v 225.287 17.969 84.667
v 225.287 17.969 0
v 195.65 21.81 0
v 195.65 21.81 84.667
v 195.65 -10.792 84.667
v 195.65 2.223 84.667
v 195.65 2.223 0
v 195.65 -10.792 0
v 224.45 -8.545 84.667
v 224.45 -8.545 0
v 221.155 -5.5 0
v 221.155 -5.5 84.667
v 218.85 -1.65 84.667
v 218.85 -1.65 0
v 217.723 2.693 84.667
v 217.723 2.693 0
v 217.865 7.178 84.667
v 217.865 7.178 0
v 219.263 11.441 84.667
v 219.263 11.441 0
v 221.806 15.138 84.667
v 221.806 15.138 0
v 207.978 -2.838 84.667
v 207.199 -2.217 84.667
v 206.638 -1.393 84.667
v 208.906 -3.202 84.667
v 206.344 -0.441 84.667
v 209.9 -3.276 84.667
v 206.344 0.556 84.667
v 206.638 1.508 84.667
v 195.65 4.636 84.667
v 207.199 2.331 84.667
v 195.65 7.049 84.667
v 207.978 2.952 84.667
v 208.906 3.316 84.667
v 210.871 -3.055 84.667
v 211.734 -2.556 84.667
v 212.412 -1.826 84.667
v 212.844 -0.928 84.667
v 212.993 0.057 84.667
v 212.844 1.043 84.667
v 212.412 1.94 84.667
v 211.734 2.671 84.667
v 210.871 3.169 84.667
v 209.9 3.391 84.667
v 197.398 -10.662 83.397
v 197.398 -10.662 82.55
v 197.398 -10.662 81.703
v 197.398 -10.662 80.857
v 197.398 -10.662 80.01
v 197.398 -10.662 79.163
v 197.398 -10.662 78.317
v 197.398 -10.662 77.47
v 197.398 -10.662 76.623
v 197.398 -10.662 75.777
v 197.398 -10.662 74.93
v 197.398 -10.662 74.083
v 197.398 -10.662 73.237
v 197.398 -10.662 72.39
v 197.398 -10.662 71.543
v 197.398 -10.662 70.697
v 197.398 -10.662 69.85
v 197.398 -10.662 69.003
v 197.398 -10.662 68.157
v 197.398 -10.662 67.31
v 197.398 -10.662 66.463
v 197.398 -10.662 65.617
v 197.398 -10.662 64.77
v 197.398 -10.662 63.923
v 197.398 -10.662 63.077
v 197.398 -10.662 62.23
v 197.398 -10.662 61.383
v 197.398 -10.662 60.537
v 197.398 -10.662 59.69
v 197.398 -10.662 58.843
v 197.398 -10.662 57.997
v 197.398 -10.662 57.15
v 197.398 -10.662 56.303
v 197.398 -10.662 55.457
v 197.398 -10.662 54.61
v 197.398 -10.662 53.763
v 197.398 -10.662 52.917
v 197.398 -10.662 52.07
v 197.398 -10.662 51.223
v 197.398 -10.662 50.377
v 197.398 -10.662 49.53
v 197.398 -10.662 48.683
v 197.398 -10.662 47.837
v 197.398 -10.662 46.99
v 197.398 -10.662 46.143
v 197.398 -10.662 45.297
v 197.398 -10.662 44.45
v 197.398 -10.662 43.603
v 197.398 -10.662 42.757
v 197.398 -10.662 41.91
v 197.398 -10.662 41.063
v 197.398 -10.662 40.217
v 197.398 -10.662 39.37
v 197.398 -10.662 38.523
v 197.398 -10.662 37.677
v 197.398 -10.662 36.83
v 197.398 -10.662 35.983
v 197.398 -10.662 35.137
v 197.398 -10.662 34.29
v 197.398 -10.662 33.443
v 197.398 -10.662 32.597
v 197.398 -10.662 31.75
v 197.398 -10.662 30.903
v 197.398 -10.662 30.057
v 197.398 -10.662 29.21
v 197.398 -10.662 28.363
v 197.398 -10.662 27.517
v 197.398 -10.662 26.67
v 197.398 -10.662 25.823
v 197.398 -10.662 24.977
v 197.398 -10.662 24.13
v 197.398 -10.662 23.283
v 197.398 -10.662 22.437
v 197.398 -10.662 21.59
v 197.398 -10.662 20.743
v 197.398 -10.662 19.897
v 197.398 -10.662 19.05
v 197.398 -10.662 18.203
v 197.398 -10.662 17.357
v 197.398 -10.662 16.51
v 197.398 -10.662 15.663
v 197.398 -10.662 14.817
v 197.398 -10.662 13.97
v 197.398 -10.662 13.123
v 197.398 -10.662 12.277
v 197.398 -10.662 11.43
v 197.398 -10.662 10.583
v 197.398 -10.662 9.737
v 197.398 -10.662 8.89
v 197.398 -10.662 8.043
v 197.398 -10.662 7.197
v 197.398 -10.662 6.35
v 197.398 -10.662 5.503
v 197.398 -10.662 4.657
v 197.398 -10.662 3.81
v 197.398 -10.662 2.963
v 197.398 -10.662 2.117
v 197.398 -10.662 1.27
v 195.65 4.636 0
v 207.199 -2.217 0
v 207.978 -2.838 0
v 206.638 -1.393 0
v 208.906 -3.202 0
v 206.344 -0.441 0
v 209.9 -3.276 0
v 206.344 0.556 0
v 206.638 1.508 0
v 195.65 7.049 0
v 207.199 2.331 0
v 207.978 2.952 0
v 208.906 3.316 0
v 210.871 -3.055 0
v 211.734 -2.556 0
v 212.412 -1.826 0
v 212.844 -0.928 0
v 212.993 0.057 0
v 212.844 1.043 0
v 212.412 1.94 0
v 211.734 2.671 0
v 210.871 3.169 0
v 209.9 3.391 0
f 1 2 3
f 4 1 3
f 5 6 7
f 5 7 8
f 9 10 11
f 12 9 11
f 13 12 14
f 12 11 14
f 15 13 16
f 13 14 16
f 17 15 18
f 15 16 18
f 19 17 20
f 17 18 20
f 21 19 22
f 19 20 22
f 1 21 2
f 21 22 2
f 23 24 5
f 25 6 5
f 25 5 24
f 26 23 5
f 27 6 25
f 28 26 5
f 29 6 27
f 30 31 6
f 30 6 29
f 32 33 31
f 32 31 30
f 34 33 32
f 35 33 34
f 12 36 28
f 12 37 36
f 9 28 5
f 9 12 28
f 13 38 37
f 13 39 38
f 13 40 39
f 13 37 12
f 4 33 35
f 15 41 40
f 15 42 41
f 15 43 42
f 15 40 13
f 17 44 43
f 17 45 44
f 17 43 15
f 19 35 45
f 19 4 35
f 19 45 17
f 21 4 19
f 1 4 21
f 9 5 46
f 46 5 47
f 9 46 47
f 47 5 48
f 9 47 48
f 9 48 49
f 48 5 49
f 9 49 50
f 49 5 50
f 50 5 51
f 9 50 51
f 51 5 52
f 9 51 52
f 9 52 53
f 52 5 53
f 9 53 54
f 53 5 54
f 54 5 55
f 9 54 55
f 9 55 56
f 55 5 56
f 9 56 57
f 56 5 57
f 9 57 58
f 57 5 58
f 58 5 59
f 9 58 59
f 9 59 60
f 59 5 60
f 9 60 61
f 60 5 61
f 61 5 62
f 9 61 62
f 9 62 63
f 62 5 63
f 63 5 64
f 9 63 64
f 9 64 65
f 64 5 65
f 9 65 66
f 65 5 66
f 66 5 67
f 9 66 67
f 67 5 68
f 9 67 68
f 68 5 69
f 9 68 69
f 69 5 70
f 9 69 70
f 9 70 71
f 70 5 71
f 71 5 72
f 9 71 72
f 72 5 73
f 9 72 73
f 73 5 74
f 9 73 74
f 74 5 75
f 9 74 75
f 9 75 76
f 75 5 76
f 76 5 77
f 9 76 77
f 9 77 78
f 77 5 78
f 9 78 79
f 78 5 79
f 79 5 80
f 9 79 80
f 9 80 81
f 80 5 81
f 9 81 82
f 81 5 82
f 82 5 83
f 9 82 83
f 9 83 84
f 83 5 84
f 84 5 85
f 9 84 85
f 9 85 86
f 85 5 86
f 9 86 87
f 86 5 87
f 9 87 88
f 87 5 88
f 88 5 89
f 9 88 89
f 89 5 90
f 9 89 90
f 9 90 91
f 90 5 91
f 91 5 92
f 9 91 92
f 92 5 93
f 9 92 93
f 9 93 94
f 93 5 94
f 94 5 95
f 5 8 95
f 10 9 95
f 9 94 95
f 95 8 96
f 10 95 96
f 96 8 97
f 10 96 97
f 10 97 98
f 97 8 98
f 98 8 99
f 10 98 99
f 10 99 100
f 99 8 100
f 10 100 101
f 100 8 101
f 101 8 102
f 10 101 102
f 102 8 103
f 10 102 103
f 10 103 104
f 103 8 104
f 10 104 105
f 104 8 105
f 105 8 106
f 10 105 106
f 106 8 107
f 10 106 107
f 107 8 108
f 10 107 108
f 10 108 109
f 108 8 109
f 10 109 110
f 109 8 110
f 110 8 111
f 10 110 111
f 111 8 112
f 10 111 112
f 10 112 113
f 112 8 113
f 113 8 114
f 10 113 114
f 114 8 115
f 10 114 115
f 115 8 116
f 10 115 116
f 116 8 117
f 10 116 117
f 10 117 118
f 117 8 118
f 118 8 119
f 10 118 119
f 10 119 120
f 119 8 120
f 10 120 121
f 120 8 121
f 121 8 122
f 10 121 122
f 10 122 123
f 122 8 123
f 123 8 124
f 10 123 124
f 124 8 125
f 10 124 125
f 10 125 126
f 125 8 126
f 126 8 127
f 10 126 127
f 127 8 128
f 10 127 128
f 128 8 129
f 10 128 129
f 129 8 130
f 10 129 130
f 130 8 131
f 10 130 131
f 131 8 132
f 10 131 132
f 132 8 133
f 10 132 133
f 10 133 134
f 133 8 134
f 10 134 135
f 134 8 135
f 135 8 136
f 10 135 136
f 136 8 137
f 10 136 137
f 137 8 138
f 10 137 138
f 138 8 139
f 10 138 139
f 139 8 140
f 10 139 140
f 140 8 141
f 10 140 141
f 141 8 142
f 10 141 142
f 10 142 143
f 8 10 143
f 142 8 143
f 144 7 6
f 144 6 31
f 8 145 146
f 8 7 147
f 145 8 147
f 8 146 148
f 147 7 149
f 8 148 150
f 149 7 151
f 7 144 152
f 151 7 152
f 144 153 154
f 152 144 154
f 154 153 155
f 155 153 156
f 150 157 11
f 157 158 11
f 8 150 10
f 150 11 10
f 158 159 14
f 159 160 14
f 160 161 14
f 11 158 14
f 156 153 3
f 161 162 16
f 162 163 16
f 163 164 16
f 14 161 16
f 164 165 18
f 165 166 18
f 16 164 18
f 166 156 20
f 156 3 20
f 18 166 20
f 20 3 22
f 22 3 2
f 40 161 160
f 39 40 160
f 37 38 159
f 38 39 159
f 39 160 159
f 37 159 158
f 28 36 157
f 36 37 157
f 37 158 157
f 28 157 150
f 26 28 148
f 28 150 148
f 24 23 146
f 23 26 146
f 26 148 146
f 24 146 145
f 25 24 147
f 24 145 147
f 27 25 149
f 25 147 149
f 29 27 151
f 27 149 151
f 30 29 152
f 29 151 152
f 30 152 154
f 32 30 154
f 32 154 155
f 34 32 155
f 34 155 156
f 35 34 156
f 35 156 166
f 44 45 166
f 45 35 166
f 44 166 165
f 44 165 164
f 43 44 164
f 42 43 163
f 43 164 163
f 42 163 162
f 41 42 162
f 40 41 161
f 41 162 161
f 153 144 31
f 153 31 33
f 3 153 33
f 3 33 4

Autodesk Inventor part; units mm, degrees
ref_plane "YZ Plane" through (0, 0, 0) normal (1, 0, 0) x (0, 1, 0)
ref_plane "XZ Plane" through (0, 0, 0) normal (0, 1, 0) x (-1, 0, 0)
ref_plane "XY Plane" through (0, 0, 0) normal (0, 0, 1) x (1, 0, 0)
sketch "Sketch2" plane through (0, 0, 0) normal (0, 0, 1) x (1, 0, 0)
  spline S0 degree 5 poles (319.6498, 0.0573) (319.6501, 0.0612) (319.6024, 0.0717) (319.3745, 0.1032) (319.3587, 0.1577) (318.7204, 0.2502) (318.4411, 0.3675) (317.6227, 0.5236) (316.9347, 0.7102) (315.9239, 0.9334) (314.8763, 1.1861) (313.6258, 1.4728) (312.2675, 1.7887) (310.7514, 2.1347) (309.1071, 2.5099) (307.3204, 2.9131) (305.4017, 3.3421) (303.3481, 3.7974) (301.1639, 4.2757) (298.8502, 4.7782) (296.4092, 5.301) (293.8432, 5.8446) (291.1548, 6.4061) (288.3466, 6.9857) (285.4207, 7.5803) (282.3807, 8.1894) (279.2284, 8.8107) (275.968, 9.4437) (272.6016, 10.0865) (269.1329, 10.7361) (265.5656, 11.3942) (261.9019, 12.0551) (258.1469, 12.7207) (254.3029, 13.3883) (250.3742, 14.0555) (246.3647, 14.7217) (242.2776, 15.3854) (238.118, 16.0441) (233.8887, 16.6979) (229.5952, 17.3434) (225.2402, 17.981) (220.8297, 18.6074) (216.3658, 19.2226) (211.8552, 19.8242) (207.3009, 20.4107) (202.7077, 20.9813) (198.0804, 21.5339) (193.4232, 22.0679) (188.7413, 22.58) (184.0389, 23.0713) (179.321, 23.5382) (174.592, 23.982) (169.8567, 24.3971) (165.1201, 24.7874) (160.3872, 25.1472) (155.6604, 25.4776) (150.948, 25.7772) (146.2454, 26.0449) (141.5744, 26.278) (136.9015, 26.4795) (132.2479, 26.6311) (127.6319, 26.7393) (123.054, 26.7999) (118.5202, 26.8147) (114.0397, 26.7815) (109.6094, 26.7031) (105.2517, 26.5723) (100.9331, 26.4088) (96.7495, 26.1663) (92.5147, 25.9483) (88.6376, 25.5343) (84.2302, 25.3974) (81.2071, 24.5612) (76.5297, 24.5259) (73.18, 23.8676) (69.3619, 23.413) (65.9721, 22.8018) (62.3454, 22.244) (59.4319, 21.514) (55.4307, 21.0148) (53.2464, 20.1084) (49.5889, 19.537) (47.2944, 18.6473) (44.3884, 17.909) (41.914, 17.071) (39.4431, 16.2394) (37.1538, 15.3738) (34.9769, 14.4941) (32.9455, 13.5944) (31.0501, 12.6807) (29.2961, 11.7542) (27.6837, 10.8151) (26.2149, 9.8673) (24.8895, 8.9103) (23.7099, 7.9467) (22.6751, 6.976) (21.7868, 6.0004) (21.0458, 5.0186) (20.4526, 4.032) (20.0117, 3.0392) (19.7221, 2.0438) (19.5893, 1.0479) (19.6118, 0.0538) (19.7865, -0.9258) (20.1138, -1.8742) (20.591, -2.7944) (21.2165, -3.6796) (21.9855, -4.5321) (22.8956, -5.3514) (23.9453, -6.1385) (25.1332, -6.8944) (26.4582, -7.6188) (27.9184, -8.3123) (29.5136, -8.9751) (31.2409, -9.6071) (33.0997, -10.2067) (35.0892, -10.7758) (37.2002, -11.3131) (39.4562, -11.8174) (41.7927, -12.2939) (44.3651, -12.7275) (46.7744, -13.1584) (50.0005, -13.481) (52.1533, -13.8927) (55.9371, -14.1294) (58.2153, -14.4717) (61.732, -14.6854) (64.8012, -14.9153) (68.2287, -15.092) (71.6338, -15.2498) (75.1915, -15.3722) (78.8138, -15.4692) (82.5326, -15.5359) (86.3291, -15.5764) (90.2061, -15.5901) (94.1575, -15.5787) (98.1812, -15.5438) (102.2727, -15.4851) (106.4286, -15.4059) (110.6456, -15.3062) (114.9188, -15.1867) (119.2459, -15.0512) (123.6218, -14.8988) (128.0442, -14.7319) (132.5111, -14.552) (137.0141, -14.3592) (141.5621, -14.1606) (146.1675, -13.9403) (150.787, -13.7052) (155.434, -13.4523) (160.0951, -13.1857) (164.7676, -12.9046) (169.4465, -12.6129) (174.1261, -12.3082) (178.8033, -11.9955) (183.4722, -11.6727) (188.1294, -11.3426) (192.7696, -11.0072) (197.3886, -10.6641) (201.9818, -10.3188) (206.5448, -9.9678) (211.0728, -9.6157) (215.5623, -9.2611) (220.0069, -8.9047) (224.4048, -8.5497) (228.7492, -8.193) (233.0373, -7.8393) (237.2647, -7.4865) (241.4259, -7.1353) (245.5189, -6.7884) (249.5374, -6.4441) (253.4791, -6.104) (257.3389, -5.7683) (261.1136, -5.4376) (264.7987, -5.113) (268.3914, -4.7937) (271.8871, -4.4807) (275.2826, -4.1749) (278.5752, -3.8759) (281.7596, -3.585) (284.8354, -3.3021) (287.7962, -3.0278) (290.6419, -2.763) (293.3672, -2.5063) (295.9712, -2.2616) (298.4496, -2.0246) (300.8012, -1.801) (303.0222, -1.5859) (305.1122, -1.3849) (307.0656, -1.194) (308.8864, -1.0166) (310.5623, -0.8504) (312.1091, -0.6993) (313.4945, -0.5587) (314.7717, -0.4371) (315.8415, -0.3205) (316.8737, -0.2329) (317.5782, -0.1363) (318.4119, -0.0906) (318.7016, -0.0103) (319.3493, -0.0034) (319.3699, 0.0485) (319.6005, 0.0494) (319.6495, 0.0534) (319.6498, 0.0573) knots 0 0 0 0 0 0 0.001406 0.002637 0.004353 0.006443 0.008834 0.011487 0.014375 0.017478 0.020781 0.02427 0.027934 0.031762 0.035746 0.039878 0.044151 0.048559 0.053094 0.057751 0.062526 0.067412 0.072404 0.077499 0.082692 0.087977 0.093351 0.098811 0.104351 0.109968 0.115658 0.121418 0.127243 0.133131 0.139077 0.145079 0.151132 0.157233 0.163379 0.169567 0.175793 0.182054 0.188346 0.194667 0.201013 0.20738 0.213767 0.220168 0.226582 0.233004 0.239433 0.245864 0.252294 0.258721 0.265141 0.27155 0.27795 0.284339 0.290715 0.297074 0.303413 0.309725 0.316005 0.32225 0.328456 0.33462 0.340739 0.34681 0.352829 0.358735 0.364639 0.370482 0.376261 0.381971 0.38767 0.393236 0.398773 0.404177 0.409526 0.414755 0.419891 0.424884 0.429828 0.434638 0.439375 0.444 0.448512 0.452907 0.457182 0.461332 0.465356 0.469251 0.473017 0.476652 0.480158 0.48354 0.486805 0.489964 0.493033 0.496034 0.498989 0.501921 0.504852 0.507807 0.510807 0.513873 0.517028 0.520286 0.523658 0.527152 0.530771 0.534516 0.538388 0.542384 0.546503 0.550741 0.555095 0.559563 0.56414 0.568856 0.57364 0.578576 0.583553 0.588622 0.593747 0.598989 0.604262 0.609667 0.615146 0.620698 0.626318 0.632003 0.637751 0.643558 0.649421 0.655338 0.661304 0.667318 0.673375 0.679474 0.685611 0.691783 0.697987 0.704223 0.710491 0.716788 0.723111 0.729457 0.73582 0.742195 0.748576 0.754963 0.761351 0.767737 0.774118 0.780492 0.786854 0.793202 0.799533 0.805843 0.812129 0.818388 0.824617 0.830812 0.836971 0.843089 0.849164 0.855191 0.861169 0.867092 0.872959 0.878764 0.884505 0.890178 0.895778 0.901303 0.906749 0.91211 0.917384 0.922566 0.927651 0.932635 0.937513 0.942281 0.946932 0.951462 0.955865 0.960134 0.964263 0.968244 0.97207 0.975732 0.979219 0.982521 0.985624 0.988511 0.991164 0.993554 0.995643 0.997359 0.998591 1 1 1 1 1 1
  circle A0 centre (79.5135, 4.6359) radius 11.959
  line L0 (79.5135, 4.6359) -> (79.5135, 24.6083) construction
  circle A1 centre (209.6498, 0.0573) radius 3.343
  line L1 (79.5135, 4.6359) -> (209.6498, 4.6359) construction
  line L2 (319.6498, 0.0573) -> (219.6498, 0.0573) construction
  line L3 (219.6499, 18.7671) -> (219.6499, -8.9327) construction
  line L4 (28.0055, 4.5054) -> (28.0055, -2.4946)
  line L5 (19.627, 1.0326) -> (319.6498, 0.0573) construction
  line L6 (49.7105, 14.4213) -> (55.6079, 14.4213)
  line L7 (49.7104, -8.4915) -> (55.6078, -8.4915)
  line L8 (28.0055, 4.5054) -> (49.7105, 14.4213)
  line L9 (28.0055, -2.4946) -> (49.7104, -8.4915)
  line L10 (55.6079, 14.4213) -> (55.6079, 20.8726)
  line L11 (55.6078, -8.4915) -> (55.6078, -14.1513)
  line L12 (108.6496, 16.398) -> (108.6496, -7.1261)
  line L13 (110.8735, -9.1136) -> (193.8736, 0.2359)
  line L14 (195.6498, 2.2233) -> (195.6498, 7.0486)
  line L15 (193.8736, 9.036) -> (110.8735, 18.3854)
  arc A2 (110.8735, 18.3854) -> (108.6496, 16.398) centre (110.6496, 16.398) ccw
  arc A3 (108.6496, -7.1261) -> (110.8735, -9.1136) centre (110.6496, -7.1261) ccw
  arc A4 (193.8736, 0.2359) -> (195.6498, 2.2233) centre (193.6498, 2.2233) ccw
  arc A5 (195.6498, 7.0486) -> (193.8736, 9.036) centre (193.6498, 7.0486) ccw
  arc A6 (225.2869, 17.9694) -> (224.4503, -8.5446) centre (233.3969, 4.4433) ccw
  line L16 (195.6498, 4.6359) -> (195.6498, -10.7925)
  line L17 (195.6498, 4.6359) -> (195.6498, 21.8096)
  point P0 (0, 0)
  point P1 (319.3573, 0.1272)
  point P2 (318.9918, 0.2142)
  point P3 (318.4802, 0.3354)
  point P4 (317.8238, 0.4911)
  point P5 (317.0222, 0.6801)
  point P6 (316.0769, 0.9024)
  point P7 (314.9885, 1.1568)
  point P8 (313.7582, 1.443)
  point P9 (312.3866, 1.7598)
  point P10 (310.8752, 2.1063)
  point P11 (309.2258, 2.4819)
  point P12 (307.4393, 2.8854)
  point P13 (305.5178, 3.3153)
  point P14 (303.4628, 3.7707)
  point P15 (301.2764, 4.2501)
  point P16 (298.9607, 4.7526)
  point P17 (296.5175, 5.2764)
  point P18 (293.9492, 5.8203)
  point P19 (291.2585, 6.3828)
  point P20 (288.4478, 6.9627)
  point P21 (285.5195, 7.5582)
  point P22 (282.4766, 8.1678)
  point P23 (279.3218, 8.79)
  point P24 (276.0584, 9.4236)
  point P25 (272.6891, 10.0668)
  point P26 (269.2175, 10.7178)
  point P27 (265.6469, 11.3757)
  point P28 (261.9803, 12.0381)
  point P29 (258.2219, 12.7041)
  point P30 (254.3747, 13.3722)
  point P31 (250.4426, 14.0403)
  point P32 (246.4295, 14.7072)
  point P33 (242.339, 15.3714)
  point P34 (238.1756, 16.0311)
  point P35 (233.9428, 16.6851)
  point P36 (229.6454, 17.3316)
  point P37 (220.8723, 18.5967)
  point P38 (216.4049, 19.2123)
  point P39 (211.8901, 19.8144)
  point P40 (207.332, 20.4015)
  point P41 (202.7347, 20.9724)
  point P42 (198.1034, 21.5256)
  point P43 (193.4423, 22.0596)
  point P44 (188.7563, 22.5726)
  point P45 (184.0499, 23.0637)
  point P46 (179.3279, 23.5314)
  point P47 (174.5948, 23.9745)
  point P48 (169.8554, 24.3909)
  point P49 (165.1148, 24.7803)
  point P50 (160.3775, 25.1406)
  point P51 (155.6479, 25.4709)
  point P52 (150.9316, 25.7703)
  point P53 (146.233, 26.0373)
  point P54 (141.557, 26.2707)
  point P55 (136.882, 26.4681)
  point P56 (132.2209, 26.6211)
  point P57 (127.5964, 26.7282)
  point P58 (123.0133, 26.7888)
  point P59 (118.4761, 26.8026)
  point P60 (113.9902, 26.7693)
  point P61 (109.5601, 26.6886)
  point P62 (105.191, 26.5611)
  point P63 (100.8866, 26.3866)
  point P64 (96.6524, 26.1647)
  point P65 (92.4927, 25.8975)
  point P66 (88.4121, 25.5832)
  point P67 (84.4152, 25.2282)
  point P68 (80.9052, 24.7441)
  point P69 (76.6873, 24.3761)
  point P70 (72.9635, 23.8905)
  point P71 (69.3402, 23.3611)
  point P72 (65.8208, 22.7938)
  point P73 (62.4086, 22.1883)
  point P74 (59.107, 21.5464)
  point P75 (52.8493, 20.1606)
  point P76 (49.7105, 19.4213)
  point P77 (47.0737, 18.6507)
  point P78 (44.3741, 17.8542)
  point P79 (41.8034, 17.0322)
  point P80 (39.3638, 16.1874)
  point P81 (37.0583, 15.3213)
  point P82 (34.8884, 14.4363)
  point P83 (32.8568, 13.534)
  point P84 (30.965, 12.6166)
  point P85 (29.2145, 11.686)
  point P86 (27.6071, 10.7437)
  point P87 (26.1443, 9.7921)
  point P88 (24.8269, 8.8324)
  point P89 (23.6566, 7.8664)
  point P90 (22.6336, 6.8953)
  point P91 (21.7591, 5.9209)
  point P92 (21.0334, 4.9441)
  point P93 (20.4571, 3.9661)
  point P94 (20.0308, 2.9875)
  point P95 (19.7539, 2.0098)
  point P96 (19.6496, 0.0573)
  point P97 (19.8205, -0.9033)
  point P98 (20.1376, -1.8357)
  point P99 (20.6002, -2.7402)
  point P100 (21.208, -3.6159)
  point P101 (21.9598, -4.4628)
  point P102 (22.8544, -5.2806)
  point P103 (23.8909, -6.069)
  point P104 (25.0681, -6.8277)
  point P105 (26.3846, -7.5561)
  point P106 (27.8384, -8.2539)
  point P107 (29.4284, -8.9211)
  point P108 (31.1522, -9.5571)
  point P109 (33.0086, -10.1613)
  point P110 (34.9949, -10.734)
  point P111 (37.1093, -11.2746)
  point P112 (39.3497, -11.7828)
  point P113 (41.7134, -12.2586)
  point P114 (44.198, -12.702)
  point P115 (46.8014, -13.1127)
  point P116 (49.7104, -13.4915)
  point P117 (52.3532, -13.8357)
  point P118 (58.3469, -14.4294)
  point P119 (61.5023, -14.6781)
  point P120 (64.7591, -14.8953)
  point P121 (68.1149, -15.0813)
  point P122 (71.5661, -15.237)
  point P123 (75.1094, -15.3627)
  point P124 (78.7418, -15.4596)
  point P125 (82.46, -15.528)
  point P126 (86.2607, -15.5691)
  point P127 (90.14, -15.5838)
  point P128 (94.0946, -15.5733)
  point P129 (98.1212, -15.5388)
  point P130 (102.2159, -15.4812)
  point P131 (106.3751, -15.4023)
  point P132 (110.5952, -15.303)
  point P133 (114.872, -15.1845)
  point P134 (119.2022, -15.0489)
  point P135 (123.5813, -14.8971)
  point P136 (128.006, -14.7306)
  point P137 (132.4718, -14.5509)
  point P138 (136.9748, -14.3598)
  point P139 (141.5285, -14.1576)
  point P140 (146.1365, -13.9383)
  point P141 (150.7679, -13.7022)
  point P142 (155.4191, -13.4499)
  point P143 (160.0853, -13.1829)
  point P144 (164.7617, -12.9024)
  point P145 (169.4444, -12.6099)
  point P146 (174.1283, -12.306)
  point P147 (178.8092, -11.9925)
  point P148 (183.4823, -11.67)
  point P149 (188.1434, -11.34)
  point P150 (192.7877, -11.0037)
  point P151 (197.4106, -10.6614)
  point P152 (202.0079, -10.3149)
  point P153 (206.5747, -9.9645)
  point P154 (211.1069, -9.6117)
  point P155 (215.5999, -9.2568)
  point P156 (220.0489, -8.9007)
  point P157 (228.7987, -8.1885)
  point P158 (233.0906, -7.8339)
  point P159 (237.3214, -7.4808)
  point P160 (241.4866, -7.1298)
  point P161 (245.5828, -6.7821)
  point P162 (249.6052, -6.4377)
  point P163 (253.5502, -6.0972)
  point P164 (257.4136, -5.7612)
  point P165 (261.1915, -5.4303)
  point P166 (264.88, -5.1051)
  point P167 (268.4758, -4.7856)
  point P168 (271.9747, -4.4724)
  point P169 (275.3734, -4.1661)
  point P170 (278.6686, -3.867)
  point P171 (281.8564, -3.5757)
  point P172 (284.9344, -3.2925)
  point P173 (287.8984, -3.018)
  point P174 (290.7463, -2.7525)
  point P175 (293.4745, -2.4963)
  point P176 (296.0806, -2.2503)
  point P177 (298.5616, -2.0142)
  point P178 (300.9151, -1.7892)
  point P179 (303.1387, -1.575)
  point P180 (305.23, -1.3728)
  point P181 (307.1866, -1.1823)
  point P182 (309.007, -1.0041)
  point P183 (310.6885, -0.8385)
  point P184 (312.2302, -0.6861)
  point P185 (313.6297, -0.5472)
  point P186 (314.8861, -0.4221)
  point P187 (315.9976, -0.3108)
  point P188 (316.9636, -0.2139)
  point P189 (317.7826, -0.1314)
  point P190 (318.4537, -0.0636)
  point P191 (318.9766, -0.0108)
  point P192 (319.3503, 0.027)
  point P193 (319.5743, 0.0498)
  point P194 (28.0055, 1.0054)
  point P195 (108.6496, 18.6359)
  point P196 (108.6496, -9.3641)
  point P197 (195.6498, 0.4359)
  point P198 (195.6498, 8.8359)
  point P199 (108.6496, 4.6359)
  dimension "d2" = 300.0001
  dimension "d18" = 6.686
  dimension "d19" = 110
  dimension "d22" = 100
  dimension "d23" = 7
  dimension "d24" = 5
  dimension "d25" = 5
  dimension "d30" = 28
  dimension "d31" = 8.4
  dimension "d33" = 14
  dimension "d34" = 2
  dimension "d37" = 23.918
  dimension "d44" = 198
  dimension "d46" = 59.8865
extrude "Extrusion7" add sketch "Sketch2" along normal blind 84.6667 contours A6 S0 L16 L14 L17
properties part number "2414 basic aerofoil" material "Polyurethane Foam"
